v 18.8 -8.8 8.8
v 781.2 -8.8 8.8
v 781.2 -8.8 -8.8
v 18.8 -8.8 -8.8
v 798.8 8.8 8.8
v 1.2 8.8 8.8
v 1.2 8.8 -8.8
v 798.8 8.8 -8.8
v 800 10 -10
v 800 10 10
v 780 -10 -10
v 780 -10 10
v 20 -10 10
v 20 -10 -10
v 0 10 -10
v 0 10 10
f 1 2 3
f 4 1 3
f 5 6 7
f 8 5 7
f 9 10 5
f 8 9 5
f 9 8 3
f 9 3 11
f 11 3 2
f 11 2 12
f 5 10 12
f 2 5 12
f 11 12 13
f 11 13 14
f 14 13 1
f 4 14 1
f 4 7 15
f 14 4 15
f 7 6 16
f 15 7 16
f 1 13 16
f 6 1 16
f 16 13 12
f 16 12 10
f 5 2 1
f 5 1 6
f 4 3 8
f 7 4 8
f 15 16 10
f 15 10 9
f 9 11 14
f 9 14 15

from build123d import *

# Parameters (mm, degrees)
SKETCH1_W               = 20
SKETCH1_H               = 20
SKETCH1_W_2             = 17.6
SKETCH1_H_2             = 17.6
BOSS_EXTRUDE1_DEPTH     = 800
CUT_EXTRUDE1_DEPTH      = 1
CUT_EXTRUDE1_DEPTH_BACK = 21
CUT_EXTRUDE2_DEPTH      = 1
CUT_EXTRUDE2_DEPTH_BACK = 21


with BuildPart() as part:
    # Sketch1 → Boss-Extrude1 (new body)
    with BuildSketch(Plane(origin=(0, 0, 0), x_dir=(0, 0, -1), z_dir=(1, 0, 0))):
        Rectangle(SKETCH1_W, SKETCH1_H)
        Rectangle(SKETCH1_W_2, SKETCH1_H_2, mode=Mode.SUBTRACT)
    extrude(amount=BOSS_EXTRUDE1_DEPTH)

    # Sketch2 → Cut-Extrude1 (cut, two sides)
    with BuildSketch(Plane.XY.offset(10)) as cut_extrude1_sk:
        Polygon((-1138.795415875, 1148.795415875), (0, 10), (20, -10), (1158.795415875, -1148.795415875), (-1118.795415875, -3426.386247626), (-3416.386247626, -1128.795415876), align=None)
    extrude(amount=CUT_EXTRUDE1_DEPTH, mode=Mode.SUBTRACT)
    extrude(cut_extrude1_sk.sketch, amount=-CUT_EXTRUDE1_DEPTH_BACK, mode=Mode.SUBTRACT)

    # Sketch3 → Cut-Extrude2 (cut, two sides)
    with BuildSketch(Plane.XY.offset(10)) as cut_extrude2_sk:
        Polygon((1938.795415875, 1148.795415875), (800, 10), (780, -10), (-358.795415875, -1148.795415875), (1918.795415876, -3426.386247626), (4216.386247626, -1128.795415875), align=None)
    extrude(amount=CUT_EXTRUDE2_DEPTH, mode=Mode.SUBTRACT)
    extrude(cut_extrude2_sk.sketch, amount=-CUT_EXTRUDE2_DEPTH_BACK, mode=Mode.SUBTRACT)


solid = part.part
